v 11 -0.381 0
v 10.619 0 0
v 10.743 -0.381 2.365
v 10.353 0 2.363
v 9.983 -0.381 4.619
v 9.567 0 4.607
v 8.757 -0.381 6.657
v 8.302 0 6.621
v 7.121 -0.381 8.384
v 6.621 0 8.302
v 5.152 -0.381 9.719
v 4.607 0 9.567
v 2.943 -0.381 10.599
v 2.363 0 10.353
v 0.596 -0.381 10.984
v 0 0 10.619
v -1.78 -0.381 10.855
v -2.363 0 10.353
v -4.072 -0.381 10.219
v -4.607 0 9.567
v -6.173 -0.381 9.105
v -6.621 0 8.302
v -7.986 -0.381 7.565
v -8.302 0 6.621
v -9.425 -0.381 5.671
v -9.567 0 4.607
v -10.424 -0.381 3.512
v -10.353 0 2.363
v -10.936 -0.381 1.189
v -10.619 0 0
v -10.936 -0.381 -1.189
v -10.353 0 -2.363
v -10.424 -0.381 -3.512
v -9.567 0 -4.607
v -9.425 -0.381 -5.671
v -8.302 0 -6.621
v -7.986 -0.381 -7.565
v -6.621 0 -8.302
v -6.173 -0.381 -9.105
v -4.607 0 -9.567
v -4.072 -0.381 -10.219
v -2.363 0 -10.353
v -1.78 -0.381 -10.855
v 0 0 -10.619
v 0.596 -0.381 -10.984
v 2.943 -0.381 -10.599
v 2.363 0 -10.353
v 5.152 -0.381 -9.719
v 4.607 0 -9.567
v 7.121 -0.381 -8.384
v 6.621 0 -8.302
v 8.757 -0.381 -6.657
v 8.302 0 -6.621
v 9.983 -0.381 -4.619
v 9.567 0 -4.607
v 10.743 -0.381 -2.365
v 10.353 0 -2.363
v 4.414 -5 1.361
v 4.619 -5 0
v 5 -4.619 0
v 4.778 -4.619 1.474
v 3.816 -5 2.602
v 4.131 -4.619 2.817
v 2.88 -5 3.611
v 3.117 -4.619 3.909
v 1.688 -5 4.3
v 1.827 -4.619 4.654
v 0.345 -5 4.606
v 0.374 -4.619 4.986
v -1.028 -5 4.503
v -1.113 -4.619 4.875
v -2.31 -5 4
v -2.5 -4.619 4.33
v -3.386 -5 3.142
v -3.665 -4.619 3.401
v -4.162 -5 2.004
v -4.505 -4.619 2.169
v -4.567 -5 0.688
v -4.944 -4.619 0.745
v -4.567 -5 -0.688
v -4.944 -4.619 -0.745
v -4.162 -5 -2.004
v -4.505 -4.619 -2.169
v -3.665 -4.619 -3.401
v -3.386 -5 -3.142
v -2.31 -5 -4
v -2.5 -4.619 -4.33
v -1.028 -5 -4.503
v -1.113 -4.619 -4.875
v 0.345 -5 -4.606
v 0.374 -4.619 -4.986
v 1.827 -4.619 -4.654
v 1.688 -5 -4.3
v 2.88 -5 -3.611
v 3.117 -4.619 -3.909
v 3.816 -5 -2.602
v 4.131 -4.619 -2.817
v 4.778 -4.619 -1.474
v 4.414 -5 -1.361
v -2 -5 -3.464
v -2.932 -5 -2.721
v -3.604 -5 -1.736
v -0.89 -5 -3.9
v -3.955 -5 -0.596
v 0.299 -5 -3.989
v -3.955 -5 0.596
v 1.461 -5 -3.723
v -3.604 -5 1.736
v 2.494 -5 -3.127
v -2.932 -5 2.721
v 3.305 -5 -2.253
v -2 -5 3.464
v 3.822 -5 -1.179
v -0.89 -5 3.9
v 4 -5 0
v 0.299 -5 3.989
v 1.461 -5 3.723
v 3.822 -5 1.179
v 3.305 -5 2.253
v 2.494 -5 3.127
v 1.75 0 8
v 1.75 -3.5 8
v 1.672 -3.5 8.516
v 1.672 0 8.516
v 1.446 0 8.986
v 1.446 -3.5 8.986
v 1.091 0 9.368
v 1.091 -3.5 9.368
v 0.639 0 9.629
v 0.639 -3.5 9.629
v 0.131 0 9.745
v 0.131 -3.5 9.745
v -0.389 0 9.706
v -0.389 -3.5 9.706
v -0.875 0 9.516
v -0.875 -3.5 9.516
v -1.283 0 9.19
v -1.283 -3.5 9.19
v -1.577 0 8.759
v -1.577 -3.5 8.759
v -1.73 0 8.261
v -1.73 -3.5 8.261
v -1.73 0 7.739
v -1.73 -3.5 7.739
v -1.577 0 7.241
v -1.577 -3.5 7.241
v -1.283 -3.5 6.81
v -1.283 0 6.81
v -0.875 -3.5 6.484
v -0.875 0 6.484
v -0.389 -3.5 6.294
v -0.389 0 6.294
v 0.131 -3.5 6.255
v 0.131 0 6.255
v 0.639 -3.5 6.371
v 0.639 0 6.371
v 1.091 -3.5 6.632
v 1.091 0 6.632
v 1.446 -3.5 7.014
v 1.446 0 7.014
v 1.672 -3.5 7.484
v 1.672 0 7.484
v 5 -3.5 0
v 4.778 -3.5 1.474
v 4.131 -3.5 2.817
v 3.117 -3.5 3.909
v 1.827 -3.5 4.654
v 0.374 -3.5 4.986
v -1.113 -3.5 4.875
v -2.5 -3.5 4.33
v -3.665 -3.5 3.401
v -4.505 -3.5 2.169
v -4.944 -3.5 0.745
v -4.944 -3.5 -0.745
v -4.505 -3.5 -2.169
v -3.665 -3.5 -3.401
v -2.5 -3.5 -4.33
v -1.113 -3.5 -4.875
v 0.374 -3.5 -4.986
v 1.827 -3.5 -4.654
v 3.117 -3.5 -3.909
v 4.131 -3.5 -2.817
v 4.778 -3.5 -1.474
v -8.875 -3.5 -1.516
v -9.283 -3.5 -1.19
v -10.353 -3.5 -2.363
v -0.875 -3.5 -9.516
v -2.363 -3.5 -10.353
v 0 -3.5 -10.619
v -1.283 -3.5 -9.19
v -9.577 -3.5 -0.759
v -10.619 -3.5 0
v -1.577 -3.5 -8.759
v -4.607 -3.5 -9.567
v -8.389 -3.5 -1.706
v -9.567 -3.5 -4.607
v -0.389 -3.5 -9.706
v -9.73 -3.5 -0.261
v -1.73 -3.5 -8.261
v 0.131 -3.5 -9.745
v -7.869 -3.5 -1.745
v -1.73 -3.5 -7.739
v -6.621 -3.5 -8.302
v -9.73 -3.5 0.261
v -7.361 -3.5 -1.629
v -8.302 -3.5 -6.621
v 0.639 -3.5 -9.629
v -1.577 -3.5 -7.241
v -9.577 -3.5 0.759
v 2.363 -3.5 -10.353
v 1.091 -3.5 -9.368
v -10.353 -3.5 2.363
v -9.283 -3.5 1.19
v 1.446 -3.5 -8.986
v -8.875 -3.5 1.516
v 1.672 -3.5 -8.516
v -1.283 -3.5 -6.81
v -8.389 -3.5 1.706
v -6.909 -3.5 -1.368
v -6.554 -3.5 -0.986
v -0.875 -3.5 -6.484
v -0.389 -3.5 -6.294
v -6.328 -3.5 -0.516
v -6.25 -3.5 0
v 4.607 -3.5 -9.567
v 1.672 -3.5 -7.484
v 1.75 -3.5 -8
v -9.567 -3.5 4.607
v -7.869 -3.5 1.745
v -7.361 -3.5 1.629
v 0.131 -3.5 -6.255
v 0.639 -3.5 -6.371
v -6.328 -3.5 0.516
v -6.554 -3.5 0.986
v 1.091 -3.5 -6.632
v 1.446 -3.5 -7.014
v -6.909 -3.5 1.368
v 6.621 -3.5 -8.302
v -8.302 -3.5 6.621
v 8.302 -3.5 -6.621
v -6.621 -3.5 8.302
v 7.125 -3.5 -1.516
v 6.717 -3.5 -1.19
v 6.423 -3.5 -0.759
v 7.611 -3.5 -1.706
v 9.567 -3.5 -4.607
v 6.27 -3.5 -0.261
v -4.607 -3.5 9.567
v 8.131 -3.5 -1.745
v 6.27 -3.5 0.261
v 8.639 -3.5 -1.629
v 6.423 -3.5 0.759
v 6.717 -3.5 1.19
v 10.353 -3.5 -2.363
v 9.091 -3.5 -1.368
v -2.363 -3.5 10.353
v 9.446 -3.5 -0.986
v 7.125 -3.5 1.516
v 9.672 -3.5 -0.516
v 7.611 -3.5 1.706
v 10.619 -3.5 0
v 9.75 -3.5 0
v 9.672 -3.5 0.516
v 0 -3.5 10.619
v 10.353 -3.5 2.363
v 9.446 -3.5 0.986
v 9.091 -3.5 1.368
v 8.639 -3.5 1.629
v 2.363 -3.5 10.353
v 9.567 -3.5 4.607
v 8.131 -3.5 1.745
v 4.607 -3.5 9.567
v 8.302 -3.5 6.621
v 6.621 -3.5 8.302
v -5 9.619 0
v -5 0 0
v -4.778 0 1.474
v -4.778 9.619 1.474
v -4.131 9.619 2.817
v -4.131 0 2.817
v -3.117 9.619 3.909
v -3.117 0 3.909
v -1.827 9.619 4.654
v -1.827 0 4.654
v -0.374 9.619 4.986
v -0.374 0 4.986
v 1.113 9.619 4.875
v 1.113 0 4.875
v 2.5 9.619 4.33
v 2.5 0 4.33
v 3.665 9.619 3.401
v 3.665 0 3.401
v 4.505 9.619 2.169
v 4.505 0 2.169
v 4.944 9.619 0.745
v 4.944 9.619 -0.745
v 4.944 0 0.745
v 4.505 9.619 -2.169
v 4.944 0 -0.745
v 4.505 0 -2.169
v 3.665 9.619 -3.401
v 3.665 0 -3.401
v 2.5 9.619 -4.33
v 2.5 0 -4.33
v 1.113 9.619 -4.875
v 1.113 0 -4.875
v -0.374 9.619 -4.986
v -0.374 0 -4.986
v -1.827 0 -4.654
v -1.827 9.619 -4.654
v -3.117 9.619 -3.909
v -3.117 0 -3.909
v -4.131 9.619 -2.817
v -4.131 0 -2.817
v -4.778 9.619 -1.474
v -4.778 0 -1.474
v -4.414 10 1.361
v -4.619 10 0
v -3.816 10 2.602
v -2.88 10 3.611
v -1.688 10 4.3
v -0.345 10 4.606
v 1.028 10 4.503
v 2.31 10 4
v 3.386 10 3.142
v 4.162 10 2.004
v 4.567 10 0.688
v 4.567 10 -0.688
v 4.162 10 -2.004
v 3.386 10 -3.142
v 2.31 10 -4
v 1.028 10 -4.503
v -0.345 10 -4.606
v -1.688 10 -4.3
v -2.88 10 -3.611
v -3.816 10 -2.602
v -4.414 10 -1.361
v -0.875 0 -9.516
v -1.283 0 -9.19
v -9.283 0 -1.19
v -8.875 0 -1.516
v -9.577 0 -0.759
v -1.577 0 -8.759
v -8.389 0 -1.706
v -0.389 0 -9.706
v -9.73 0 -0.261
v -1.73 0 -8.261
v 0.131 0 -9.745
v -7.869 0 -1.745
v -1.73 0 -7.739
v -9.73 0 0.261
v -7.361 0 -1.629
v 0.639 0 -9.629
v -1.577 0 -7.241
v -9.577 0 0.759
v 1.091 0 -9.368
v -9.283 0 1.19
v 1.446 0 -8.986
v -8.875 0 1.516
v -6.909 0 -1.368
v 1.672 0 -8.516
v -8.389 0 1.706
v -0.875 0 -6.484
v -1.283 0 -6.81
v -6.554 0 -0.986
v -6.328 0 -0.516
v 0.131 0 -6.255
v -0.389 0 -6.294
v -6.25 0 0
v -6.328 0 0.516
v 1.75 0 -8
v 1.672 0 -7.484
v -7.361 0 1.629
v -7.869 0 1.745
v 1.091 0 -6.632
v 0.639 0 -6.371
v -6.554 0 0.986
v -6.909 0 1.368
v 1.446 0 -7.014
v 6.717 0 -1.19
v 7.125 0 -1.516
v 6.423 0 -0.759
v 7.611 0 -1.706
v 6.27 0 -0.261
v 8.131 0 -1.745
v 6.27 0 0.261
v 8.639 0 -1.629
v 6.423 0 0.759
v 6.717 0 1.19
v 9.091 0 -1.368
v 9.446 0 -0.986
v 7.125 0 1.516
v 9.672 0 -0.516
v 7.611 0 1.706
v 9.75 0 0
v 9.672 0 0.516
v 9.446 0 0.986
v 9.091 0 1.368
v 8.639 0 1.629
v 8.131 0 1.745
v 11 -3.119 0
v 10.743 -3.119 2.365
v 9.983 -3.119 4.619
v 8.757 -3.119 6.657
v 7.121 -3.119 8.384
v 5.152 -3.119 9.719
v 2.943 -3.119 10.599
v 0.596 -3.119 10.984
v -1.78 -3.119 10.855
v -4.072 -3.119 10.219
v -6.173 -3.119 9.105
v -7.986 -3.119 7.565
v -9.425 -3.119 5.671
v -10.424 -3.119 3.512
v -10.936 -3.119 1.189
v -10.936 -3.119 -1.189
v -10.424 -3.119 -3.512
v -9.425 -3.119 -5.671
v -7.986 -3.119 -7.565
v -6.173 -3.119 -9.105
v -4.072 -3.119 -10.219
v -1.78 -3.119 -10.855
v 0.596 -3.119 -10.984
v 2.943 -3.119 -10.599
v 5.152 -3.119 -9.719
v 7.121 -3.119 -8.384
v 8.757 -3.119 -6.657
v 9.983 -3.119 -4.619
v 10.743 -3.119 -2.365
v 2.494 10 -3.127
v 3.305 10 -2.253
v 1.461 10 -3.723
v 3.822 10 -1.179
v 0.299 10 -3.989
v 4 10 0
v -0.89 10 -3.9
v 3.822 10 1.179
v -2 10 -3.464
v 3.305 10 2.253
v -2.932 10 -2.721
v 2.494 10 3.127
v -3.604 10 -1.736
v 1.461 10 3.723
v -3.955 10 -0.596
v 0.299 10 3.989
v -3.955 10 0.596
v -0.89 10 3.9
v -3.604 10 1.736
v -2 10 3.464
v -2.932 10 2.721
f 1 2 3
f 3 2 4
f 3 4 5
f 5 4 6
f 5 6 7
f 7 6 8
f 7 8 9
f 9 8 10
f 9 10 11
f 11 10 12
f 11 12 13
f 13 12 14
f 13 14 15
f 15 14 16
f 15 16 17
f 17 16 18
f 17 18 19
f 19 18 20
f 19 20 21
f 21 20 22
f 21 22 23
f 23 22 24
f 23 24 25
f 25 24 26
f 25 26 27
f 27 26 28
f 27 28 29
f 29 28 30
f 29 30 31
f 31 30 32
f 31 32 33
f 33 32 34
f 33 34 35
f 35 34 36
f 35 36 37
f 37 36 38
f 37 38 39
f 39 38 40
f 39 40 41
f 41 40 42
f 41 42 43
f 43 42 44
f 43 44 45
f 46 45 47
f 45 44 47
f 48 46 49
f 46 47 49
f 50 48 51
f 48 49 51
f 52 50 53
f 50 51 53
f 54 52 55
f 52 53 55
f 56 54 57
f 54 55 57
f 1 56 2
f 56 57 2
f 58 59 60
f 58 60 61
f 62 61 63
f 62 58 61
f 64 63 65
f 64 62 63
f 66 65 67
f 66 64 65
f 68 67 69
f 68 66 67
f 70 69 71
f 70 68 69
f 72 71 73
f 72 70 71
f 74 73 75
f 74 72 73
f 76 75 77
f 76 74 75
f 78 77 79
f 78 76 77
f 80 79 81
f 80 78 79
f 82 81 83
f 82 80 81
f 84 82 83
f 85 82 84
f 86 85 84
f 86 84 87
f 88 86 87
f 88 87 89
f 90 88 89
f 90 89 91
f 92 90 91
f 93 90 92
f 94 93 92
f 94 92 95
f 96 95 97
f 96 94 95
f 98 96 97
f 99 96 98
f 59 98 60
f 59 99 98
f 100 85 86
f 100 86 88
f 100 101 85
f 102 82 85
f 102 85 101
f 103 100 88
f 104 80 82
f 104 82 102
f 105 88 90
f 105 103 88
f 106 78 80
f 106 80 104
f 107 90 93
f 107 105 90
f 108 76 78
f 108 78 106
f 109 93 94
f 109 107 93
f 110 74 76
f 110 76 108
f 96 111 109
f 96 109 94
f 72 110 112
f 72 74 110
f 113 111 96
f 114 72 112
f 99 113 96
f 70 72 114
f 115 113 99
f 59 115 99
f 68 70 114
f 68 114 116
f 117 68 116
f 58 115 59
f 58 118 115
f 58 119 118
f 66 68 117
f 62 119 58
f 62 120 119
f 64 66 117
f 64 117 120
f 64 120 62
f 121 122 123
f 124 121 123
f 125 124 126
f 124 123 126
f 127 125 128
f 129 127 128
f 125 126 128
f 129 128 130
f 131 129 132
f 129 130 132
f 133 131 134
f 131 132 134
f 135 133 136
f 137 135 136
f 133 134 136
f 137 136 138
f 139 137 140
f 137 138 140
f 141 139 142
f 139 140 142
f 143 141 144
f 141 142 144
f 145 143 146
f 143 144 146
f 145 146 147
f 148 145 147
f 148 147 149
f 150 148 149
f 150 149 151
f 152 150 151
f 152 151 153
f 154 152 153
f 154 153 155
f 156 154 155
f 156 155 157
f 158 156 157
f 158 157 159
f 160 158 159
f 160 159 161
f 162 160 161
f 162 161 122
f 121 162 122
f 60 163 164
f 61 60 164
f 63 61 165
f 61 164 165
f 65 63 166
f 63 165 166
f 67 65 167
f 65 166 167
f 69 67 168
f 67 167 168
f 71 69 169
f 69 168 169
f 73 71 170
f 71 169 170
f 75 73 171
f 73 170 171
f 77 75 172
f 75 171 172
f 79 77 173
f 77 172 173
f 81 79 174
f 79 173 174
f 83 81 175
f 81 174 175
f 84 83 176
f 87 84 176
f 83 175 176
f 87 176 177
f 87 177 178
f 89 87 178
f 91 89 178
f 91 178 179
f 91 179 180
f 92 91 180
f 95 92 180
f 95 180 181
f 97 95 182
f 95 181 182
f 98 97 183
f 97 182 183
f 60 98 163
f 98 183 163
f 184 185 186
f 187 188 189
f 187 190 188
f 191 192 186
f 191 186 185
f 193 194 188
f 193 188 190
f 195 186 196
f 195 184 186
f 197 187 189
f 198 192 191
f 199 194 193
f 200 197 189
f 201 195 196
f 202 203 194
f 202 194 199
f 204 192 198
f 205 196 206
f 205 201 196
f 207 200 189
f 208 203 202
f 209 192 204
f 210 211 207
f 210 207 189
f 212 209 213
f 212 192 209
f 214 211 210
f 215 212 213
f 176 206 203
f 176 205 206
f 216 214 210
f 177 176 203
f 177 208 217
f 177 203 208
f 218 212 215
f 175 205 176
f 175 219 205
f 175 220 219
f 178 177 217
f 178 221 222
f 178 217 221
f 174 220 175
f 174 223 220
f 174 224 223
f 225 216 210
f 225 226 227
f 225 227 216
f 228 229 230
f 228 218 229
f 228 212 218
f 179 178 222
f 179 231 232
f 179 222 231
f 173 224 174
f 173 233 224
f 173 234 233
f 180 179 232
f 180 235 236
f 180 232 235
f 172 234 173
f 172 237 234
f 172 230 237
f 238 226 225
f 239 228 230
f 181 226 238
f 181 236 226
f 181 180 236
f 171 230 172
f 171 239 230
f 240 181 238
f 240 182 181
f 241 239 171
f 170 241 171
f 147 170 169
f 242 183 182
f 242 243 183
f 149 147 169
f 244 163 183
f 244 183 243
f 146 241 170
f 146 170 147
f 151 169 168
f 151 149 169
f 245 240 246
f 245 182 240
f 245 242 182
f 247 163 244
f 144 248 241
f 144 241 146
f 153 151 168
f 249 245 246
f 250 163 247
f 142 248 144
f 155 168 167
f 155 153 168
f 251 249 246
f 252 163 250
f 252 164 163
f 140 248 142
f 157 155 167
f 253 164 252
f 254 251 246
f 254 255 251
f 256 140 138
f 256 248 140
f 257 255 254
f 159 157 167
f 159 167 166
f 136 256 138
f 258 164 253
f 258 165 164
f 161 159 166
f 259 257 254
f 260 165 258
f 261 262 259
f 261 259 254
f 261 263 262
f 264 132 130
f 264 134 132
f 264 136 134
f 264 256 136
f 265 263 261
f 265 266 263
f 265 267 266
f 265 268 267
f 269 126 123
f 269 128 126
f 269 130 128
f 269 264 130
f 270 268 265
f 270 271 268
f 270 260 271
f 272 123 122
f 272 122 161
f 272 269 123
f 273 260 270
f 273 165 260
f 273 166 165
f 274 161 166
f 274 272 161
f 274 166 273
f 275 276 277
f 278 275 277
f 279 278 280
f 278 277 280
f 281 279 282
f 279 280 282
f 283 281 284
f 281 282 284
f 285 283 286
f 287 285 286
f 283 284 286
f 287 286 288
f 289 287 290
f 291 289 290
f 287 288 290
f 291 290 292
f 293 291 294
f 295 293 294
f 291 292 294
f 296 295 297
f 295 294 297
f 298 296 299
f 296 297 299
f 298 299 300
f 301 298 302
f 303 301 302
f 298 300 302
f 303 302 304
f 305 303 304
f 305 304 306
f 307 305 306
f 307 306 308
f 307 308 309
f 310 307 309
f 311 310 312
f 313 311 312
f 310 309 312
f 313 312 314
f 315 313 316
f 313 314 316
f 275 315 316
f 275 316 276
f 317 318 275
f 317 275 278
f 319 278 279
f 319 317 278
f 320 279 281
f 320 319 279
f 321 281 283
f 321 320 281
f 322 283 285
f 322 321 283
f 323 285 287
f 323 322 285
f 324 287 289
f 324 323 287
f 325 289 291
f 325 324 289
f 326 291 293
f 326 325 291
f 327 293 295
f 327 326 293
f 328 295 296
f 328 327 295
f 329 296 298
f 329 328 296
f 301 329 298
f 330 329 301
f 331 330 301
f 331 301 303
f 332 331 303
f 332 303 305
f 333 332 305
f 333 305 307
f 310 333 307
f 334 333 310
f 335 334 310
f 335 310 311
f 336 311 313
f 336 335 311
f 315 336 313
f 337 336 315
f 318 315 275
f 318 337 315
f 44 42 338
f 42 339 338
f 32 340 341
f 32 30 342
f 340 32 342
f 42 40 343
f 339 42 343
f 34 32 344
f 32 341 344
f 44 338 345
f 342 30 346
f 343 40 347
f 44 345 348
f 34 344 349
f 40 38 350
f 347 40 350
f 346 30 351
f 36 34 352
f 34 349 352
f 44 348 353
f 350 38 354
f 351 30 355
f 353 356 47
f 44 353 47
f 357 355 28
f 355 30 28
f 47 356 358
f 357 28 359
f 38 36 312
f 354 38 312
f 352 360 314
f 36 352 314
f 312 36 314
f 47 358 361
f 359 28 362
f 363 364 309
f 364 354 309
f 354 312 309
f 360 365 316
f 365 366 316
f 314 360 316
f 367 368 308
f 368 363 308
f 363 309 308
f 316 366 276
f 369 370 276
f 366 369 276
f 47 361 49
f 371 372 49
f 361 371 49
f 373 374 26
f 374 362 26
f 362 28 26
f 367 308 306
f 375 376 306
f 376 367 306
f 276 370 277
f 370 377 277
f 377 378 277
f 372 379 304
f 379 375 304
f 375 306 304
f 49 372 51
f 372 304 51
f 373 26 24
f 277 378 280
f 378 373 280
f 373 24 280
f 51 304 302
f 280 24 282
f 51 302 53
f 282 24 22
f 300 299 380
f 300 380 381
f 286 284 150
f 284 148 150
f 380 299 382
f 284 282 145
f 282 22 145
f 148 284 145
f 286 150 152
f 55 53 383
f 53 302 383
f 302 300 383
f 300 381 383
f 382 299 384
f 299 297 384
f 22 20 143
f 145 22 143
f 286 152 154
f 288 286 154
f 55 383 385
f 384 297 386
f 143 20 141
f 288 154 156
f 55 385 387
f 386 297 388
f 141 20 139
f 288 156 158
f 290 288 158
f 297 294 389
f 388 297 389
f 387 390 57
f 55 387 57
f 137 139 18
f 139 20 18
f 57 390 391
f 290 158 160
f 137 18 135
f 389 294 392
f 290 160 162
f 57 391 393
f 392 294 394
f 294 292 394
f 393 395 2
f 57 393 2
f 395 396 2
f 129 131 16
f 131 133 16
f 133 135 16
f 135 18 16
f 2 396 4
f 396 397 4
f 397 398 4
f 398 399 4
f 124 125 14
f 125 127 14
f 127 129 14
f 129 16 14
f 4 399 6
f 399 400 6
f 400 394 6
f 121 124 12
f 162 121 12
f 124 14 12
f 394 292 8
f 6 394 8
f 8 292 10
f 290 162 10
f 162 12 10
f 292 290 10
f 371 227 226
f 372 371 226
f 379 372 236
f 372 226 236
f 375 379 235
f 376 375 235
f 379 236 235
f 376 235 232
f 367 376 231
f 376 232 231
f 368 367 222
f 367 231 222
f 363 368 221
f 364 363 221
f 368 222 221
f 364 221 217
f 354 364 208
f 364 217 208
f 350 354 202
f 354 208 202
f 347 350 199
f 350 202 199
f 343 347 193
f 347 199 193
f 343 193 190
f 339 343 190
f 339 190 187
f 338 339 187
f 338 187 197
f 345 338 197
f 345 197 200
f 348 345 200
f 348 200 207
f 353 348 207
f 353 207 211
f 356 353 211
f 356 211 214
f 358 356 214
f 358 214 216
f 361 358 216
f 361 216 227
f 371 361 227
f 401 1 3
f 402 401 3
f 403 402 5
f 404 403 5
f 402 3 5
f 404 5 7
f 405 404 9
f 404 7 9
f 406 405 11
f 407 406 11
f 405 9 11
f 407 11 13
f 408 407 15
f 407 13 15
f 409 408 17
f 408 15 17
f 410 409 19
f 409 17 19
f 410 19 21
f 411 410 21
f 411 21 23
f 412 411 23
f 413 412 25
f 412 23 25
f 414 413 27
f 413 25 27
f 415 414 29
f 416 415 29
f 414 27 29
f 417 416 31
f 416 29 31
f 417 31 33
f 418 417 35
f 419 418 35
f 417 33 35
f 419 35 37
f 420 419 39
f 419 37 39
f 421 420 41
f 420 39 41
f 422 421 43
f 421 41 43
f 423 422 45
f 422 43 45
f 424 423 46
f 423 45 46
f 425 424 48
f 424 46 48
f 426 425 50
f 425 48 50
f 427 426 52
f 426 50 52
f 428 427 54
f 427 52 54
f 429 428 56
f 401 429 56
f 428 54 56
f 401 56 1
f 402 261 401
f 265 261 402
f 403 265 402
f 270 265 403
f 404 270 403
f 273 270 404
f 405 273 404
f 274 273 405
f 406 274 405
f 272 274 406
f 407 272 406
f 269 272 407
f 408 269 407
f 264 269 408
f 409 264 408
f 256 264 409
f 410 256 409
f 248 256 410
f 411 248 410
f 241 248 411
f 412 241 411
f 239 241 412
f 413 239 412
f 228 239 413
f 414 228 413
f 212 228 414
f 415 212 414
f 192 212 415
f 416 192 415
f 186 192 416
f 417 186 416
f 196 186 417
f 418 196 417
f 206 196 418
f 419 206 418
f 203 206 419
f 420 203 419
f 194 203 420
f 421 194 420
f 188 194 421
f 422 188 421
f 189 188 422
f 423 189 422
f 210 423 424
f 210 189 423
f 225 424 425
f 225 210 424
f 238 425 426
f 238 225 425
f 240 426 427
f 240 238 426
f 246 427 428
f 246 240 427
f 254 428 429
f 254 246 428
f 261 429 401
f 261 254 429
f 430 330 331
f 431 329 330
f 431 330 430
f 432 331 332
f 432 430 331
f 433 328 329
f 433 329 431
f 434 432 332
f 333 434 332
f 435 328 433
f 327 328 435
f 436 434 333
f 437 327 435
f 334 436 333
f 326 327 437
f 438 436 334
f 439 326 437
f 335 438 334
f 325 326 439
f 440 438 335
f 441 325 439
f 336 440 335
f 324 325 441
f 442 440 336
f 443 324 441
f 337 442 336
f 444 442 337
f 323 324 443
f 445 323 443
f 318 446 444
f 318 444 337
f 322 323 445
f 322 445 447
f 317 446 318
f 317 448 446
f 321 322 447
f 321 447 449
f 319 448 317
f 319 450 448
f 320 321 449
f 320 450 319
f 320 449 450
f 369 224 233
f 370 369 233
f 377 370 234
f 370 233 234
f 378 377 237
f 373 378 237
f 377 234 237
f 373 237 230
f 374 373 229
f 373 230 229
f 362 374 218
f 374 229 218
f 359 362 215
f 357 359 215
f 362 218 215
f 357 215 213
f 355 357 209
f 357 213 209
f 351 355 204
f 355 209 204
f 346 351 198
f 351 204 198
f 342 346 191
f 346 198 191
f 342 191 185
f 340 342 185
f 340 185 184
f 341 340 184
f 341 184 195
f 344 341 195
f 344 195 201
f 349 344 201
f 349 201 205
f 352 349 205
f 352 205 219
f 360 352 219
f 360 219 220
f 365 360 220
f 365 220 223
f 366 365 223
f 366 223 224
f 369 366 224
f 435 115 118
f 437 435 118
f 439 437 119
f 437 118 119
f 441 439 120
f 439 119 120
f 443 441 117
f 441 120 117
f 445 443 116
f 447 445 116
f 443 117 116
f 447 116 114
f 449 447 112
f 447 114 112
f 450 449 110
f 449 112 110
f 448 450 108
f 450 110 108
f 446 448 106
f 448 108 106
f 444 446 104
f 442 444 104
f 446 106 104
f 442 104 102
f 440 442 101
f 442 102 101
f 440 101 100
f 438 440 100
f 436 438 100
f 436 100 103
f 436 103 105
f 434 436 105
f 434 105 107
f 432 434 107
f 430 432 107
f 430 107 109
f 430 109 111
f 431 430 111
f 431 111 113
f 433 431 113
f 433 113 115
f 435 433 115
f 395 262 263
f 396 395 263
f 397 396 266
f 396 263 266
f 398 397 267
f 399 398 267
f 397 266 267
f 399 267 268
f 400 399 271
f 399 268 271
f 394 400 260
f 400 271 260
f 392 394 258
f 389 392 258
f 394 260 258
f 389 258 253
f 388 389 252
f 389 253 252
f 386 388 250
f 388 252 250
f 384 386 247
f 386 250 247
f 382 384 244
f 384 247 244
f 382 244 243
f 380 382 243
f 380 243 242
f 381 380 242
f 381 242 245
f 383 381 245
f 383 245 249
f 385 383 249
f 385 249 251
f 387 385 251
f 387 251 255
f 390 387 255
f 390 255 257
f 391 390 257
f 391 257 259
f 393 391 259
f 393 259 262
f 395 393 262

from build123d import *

# Parameters (mm, degrees)
F0_R     = 11
F1_DEPTH = 3.5
F2_R     = 5
F3_DEPTH = 1.5
F4_R     = 5
F5_DEPTH = 10
F6_R     = 4
F7_DEPTH = 25.4
F8_R     = 1.75
F9_DEPTH = 25.4
F10_SIZE = 0.381
F11_SIZE = 0.381


with BuildPart() as f1:
    # F0 (on Front) → F1 (new body)
    with BuildSketch(Plane.XZ):
        Circle(F0_R)
    extrude(amount=F1_DEPTH)

    # F2 (on face) → F3 (join)
    with BuildSketch(Plane.XZ.offset(3.5)):
        Circle(F2_R)
    extrude(amount=F3_DEPTH)

    # F4 (on face) → F5 (join)
    with BuildSketch(Plane(origin=(0, 0, 0), x_dir=(-1, 0, 0), z_dir=(0, 1, 0))):
        Circle(F4_R)
    extrude(amount=F5_DEPTH)

    # F6 (on face) → F7 (cut)
    with BuildSketch(Plane.XZ.offset(5)):
        Circle(F6_R)
    extrude(amount=-F7_DEPTH, mode=Mode.SUBTRACT)

    # F8 (on face) → F9 (cut)
    with BuildSketch(Plane.XZ.offset(3.5)):
        with Locations((-8, 0)):
            Circle(F8_R)
        with Locations((8, 0)):
            Circle(F8_R)
        with Locations((0, 8)):
            Circle(F8_R)
        with Locations((0, -8)):
            Circle(F8_R)
    extrude(amount=-F9_DEPTH, mode=Mode.SUBTRACT)

    # F10
    f10_edges = [f1.edges().sort_by_distance(p)[0] for p in [
        (11, -1.75, 0),
        (-11, 0, 0),
        (-11, -3.5, 0),
    ]]
    chamfer(f10_edges, length=F10_SIZE)

    # F11
    f11_edges = [f1.edges().sort_by_distance(p)[0] for p in [
        (5, 10, 0),
        (-5, -5, 0),
    ]]
    chamfer(f11_edges, length=F11_SIZE)


solid = f1.part
